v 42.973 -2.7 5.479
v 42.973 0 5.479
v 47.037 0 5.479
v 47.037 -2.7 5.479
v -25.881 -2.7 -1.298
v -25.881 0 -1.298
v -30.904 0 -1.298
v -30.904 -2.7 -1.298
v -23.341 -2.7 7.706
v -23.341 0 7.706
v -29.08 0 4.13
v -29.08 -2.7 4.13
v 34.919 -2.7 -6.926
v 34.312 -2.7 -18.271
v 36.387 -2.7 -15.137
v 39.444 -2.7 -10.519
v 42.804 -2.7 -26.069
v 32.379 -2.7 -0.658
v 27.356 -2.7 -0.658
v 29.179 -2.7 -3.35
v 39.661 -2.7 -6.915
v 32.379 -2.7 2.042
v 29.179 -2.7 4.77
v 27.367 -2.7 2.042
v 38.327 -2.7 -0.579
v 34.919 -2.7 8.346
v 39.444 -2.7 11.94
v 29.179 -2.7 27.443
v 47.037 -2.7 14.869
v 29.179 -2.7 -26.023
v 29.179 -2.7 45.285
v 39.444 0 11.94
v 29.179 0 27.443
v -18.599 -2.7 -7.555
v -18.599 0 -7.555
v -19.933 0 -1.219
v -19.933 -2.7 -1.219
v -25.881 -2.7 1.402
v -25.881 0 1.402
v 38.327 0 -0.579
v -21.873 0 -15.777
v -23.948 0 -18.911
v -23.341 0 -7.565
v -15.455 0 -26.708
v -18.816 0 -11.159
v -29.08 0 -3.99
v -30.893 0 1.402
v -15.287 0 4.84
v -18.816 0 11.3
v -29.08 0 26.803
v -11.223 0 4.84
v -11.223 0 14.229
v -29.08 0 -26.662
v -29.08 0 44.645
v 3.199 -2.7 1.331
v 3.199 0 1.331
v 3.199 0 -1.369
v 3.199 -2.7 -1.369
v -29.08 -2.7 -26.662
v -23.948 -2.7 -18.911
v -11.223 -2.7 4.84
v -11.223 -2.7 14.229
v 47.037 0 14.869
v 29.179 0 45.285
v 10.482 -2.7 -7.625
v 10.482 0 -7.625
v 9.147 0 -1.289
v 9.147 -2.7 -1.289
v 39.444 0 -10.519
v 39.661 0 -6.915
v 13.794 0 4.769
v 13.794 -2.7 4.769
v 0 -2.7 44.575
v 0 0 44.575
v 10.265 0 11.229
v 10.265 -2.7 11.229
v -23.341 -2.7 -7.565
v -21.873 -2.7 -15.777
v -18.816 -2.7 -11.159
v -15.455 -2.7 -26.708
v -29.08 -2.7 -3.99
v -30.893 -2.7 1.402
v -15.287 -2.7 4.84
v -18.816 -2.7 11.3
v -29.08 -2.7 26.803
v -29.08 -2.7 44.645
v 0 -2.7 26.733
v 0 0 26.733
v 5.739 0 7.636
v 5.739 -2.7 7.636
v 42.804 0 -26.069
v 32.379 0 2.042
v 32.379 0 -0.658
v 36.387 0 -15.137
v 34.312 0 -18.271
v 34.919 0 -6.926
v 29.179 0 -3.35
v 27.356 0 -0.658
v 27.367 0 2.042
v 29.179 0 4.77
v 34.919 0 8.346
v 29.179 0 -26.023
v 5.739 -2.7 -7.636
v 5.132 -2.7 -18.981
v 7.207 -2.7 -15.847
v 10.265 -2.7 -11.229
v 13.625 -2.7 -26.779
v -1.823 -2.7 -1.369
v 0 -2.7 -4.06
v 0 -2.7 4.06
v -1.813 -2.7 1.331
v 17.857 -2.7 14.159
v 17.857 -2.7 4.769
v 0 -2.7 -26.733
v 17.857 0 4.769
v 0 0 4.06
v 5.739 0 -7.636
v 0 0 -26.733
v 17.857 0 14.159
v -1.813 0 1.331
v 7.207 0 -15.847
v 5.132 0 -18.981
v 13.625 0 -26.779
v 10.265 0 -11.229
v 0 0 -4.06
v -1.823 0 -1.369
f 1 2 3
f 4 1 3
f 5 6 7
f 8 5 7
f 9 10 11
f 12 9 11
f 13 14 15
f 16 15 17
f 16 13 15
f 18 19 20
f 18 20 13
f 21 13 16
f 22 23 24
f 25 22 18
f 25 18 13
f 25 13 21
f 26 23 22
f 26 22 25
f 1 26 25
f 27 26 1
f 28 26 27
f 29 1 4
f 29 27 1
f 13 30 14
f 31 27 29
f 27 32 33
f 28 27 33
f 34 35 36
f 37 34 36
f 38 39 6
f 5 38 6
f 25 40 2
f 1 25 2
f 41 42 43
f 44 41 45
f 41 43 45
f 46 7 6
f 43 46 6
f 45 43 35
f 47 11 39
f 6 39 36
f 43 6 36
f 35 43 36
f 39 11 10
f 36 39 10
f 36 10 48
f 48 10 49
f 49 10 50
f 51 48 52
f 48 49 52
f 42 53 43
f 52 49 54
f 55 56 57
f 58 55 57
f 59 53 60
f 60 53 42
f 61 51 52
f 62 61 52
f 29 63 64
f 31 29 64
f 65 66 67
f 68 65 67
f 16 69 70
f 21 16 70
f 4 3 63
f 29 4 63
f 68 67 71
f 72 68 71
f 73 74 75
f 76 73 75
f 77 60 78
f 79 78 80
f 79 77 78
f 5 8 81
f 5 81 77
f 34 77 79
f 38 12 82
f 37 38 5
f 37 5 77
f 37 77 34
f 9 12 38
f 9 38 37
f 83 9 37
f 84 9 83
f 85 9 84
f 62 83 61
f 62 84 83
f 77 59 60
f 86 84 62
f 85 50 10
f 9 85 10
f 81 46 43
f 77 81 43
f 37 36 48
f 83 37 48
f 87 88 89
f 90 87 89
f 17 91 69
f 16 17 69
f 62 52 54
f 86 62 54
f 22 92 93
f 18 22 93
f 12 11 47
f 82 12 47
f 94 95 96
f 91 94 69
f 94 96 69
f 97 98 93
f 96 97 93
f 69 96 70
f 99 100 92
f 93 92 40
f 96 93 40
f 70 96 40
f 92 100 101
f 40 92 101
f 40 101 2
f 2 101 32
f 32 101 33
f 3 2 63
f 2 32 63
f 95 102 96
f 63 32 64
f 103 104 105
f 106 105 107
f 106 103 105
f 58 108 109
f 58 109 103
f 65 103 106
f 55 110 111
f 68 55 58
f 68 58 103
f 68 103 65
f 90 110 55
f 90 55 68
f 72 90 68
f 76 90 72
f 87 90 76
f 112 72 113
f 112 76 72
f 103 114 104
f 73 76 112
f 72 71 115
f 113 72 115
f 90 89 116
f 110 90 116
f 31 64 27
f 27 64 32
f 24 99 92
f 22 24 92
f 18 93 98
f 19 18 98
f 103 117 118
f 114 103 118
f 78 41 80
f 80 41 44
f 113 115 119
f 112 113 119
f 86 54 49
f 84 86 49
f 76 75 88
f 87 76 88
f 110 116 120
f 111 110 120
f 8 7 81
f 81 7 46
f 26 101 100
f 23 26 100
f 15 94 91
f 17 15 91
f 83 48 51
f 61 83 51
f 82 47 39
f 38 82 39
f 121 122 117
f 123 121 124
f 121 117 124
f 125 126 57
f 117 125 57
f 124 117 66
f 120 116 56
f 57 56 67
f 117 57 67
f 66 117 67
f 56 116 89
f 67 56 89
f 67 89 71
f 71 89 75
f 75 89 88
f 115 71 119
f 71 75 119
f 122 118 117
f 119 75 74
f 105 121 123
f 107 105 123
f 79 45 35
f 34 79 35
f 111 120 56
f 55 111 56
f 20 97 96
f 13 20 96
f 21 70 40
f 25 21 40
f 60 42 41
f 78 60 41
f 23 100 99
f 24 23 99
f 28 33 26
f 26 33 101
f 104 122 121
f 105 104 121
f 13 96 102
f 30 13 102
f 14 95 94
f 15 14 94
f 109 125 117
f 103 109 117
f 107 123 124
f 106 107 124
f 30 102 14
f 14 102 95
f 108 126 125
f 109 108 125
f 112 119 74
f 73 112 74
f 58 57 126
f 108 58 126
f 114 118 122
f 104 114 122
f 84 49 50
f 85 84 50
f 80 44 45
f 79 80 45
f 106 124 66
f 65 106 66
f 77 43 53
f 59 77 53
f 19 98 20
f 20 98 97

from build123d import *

# Parameters (mm, degrees)
F1_DEPTH = 2.7


with BuildPart() as f1:
    # F0 (on Front) → F1 (new body)
    with BuildSketch(Plane.XZ):
        Polygon((10.264915, 11.229291), (0, 26.732817), (5.73944, 7.635733), (0, 4.059977), (-1.812594, 1.331323), (0, 1.331323), (3.19931, 1.331323), (3.19931, -1.368677), (0, -1.368677), (-1.8231, -1.368677), (0, -4.059977), (5.73944, -7.635733), (0, -26.732817), (5.132457, -18.981054), (7.207236, -15.84743), (13.625177, -26.778835), (10.264915, -11.229291), (10.481588, -7.625337), (9.147359, -1.289408), (13.793755, 4.76924), (17.857403, 4.76924), (17.857403, 14.158794), (0, 44.574544), align=None)
        Polygon((-18.815528, 11.299704), (-29.080443, 26.803229), (-23.341003, 7.706146), (-29.080443, 4.13039), (-30.893037, 1.401736), (-29.080443, 1.401736), (-25.881133, 1.401736), (-25.881133, -1.298264), (-29.080443, -1.298264), (-30.903543, -1.298264), (-29.080443, -3.989565), (-23.341003, -7.56532), (-29.080443, -26.662404), (-23.947986, -18.910641), (-21.873208, -15.777017), (-15.455266, -26.708422), (-18.815528, -11.158878), (-18.598855, -7.554924), (-19.933085, -1.218995), (-15.286688, 4.839653), (-11.22304, 4.839653), (-11.22304, 14.229207), (-29.080443, 44.644957), align=None)
        Polygon((39.444231, 11.939524), (29.179316, 27.44305), (34.918756, 8.345966), (29.179316, 4.770211), (27.366722, 2.041557), (29.179316, 2.041557), (32.378626, 2.041557), (32.378626, -0.658443), (29.179316, -0.658443), (27.356216, -0.658443), (29.179316, -3.349744), (34.918756, -6.9255), (29.179316, -26.022583), (34.311773, -18.27082), (36.386552, -15.137197), (42.804493, -26.068601), (39.444231, -10.519057), (39.660904, -6.915104), (38.326675, -0.579175), (42.973071, 5.479473), (47.036719, 5.479473), (47.036719, 14.869027), (29.179316, 45.284778), align=None)
    extrude(amount=F1_DEPTH)


solid = f1.part
